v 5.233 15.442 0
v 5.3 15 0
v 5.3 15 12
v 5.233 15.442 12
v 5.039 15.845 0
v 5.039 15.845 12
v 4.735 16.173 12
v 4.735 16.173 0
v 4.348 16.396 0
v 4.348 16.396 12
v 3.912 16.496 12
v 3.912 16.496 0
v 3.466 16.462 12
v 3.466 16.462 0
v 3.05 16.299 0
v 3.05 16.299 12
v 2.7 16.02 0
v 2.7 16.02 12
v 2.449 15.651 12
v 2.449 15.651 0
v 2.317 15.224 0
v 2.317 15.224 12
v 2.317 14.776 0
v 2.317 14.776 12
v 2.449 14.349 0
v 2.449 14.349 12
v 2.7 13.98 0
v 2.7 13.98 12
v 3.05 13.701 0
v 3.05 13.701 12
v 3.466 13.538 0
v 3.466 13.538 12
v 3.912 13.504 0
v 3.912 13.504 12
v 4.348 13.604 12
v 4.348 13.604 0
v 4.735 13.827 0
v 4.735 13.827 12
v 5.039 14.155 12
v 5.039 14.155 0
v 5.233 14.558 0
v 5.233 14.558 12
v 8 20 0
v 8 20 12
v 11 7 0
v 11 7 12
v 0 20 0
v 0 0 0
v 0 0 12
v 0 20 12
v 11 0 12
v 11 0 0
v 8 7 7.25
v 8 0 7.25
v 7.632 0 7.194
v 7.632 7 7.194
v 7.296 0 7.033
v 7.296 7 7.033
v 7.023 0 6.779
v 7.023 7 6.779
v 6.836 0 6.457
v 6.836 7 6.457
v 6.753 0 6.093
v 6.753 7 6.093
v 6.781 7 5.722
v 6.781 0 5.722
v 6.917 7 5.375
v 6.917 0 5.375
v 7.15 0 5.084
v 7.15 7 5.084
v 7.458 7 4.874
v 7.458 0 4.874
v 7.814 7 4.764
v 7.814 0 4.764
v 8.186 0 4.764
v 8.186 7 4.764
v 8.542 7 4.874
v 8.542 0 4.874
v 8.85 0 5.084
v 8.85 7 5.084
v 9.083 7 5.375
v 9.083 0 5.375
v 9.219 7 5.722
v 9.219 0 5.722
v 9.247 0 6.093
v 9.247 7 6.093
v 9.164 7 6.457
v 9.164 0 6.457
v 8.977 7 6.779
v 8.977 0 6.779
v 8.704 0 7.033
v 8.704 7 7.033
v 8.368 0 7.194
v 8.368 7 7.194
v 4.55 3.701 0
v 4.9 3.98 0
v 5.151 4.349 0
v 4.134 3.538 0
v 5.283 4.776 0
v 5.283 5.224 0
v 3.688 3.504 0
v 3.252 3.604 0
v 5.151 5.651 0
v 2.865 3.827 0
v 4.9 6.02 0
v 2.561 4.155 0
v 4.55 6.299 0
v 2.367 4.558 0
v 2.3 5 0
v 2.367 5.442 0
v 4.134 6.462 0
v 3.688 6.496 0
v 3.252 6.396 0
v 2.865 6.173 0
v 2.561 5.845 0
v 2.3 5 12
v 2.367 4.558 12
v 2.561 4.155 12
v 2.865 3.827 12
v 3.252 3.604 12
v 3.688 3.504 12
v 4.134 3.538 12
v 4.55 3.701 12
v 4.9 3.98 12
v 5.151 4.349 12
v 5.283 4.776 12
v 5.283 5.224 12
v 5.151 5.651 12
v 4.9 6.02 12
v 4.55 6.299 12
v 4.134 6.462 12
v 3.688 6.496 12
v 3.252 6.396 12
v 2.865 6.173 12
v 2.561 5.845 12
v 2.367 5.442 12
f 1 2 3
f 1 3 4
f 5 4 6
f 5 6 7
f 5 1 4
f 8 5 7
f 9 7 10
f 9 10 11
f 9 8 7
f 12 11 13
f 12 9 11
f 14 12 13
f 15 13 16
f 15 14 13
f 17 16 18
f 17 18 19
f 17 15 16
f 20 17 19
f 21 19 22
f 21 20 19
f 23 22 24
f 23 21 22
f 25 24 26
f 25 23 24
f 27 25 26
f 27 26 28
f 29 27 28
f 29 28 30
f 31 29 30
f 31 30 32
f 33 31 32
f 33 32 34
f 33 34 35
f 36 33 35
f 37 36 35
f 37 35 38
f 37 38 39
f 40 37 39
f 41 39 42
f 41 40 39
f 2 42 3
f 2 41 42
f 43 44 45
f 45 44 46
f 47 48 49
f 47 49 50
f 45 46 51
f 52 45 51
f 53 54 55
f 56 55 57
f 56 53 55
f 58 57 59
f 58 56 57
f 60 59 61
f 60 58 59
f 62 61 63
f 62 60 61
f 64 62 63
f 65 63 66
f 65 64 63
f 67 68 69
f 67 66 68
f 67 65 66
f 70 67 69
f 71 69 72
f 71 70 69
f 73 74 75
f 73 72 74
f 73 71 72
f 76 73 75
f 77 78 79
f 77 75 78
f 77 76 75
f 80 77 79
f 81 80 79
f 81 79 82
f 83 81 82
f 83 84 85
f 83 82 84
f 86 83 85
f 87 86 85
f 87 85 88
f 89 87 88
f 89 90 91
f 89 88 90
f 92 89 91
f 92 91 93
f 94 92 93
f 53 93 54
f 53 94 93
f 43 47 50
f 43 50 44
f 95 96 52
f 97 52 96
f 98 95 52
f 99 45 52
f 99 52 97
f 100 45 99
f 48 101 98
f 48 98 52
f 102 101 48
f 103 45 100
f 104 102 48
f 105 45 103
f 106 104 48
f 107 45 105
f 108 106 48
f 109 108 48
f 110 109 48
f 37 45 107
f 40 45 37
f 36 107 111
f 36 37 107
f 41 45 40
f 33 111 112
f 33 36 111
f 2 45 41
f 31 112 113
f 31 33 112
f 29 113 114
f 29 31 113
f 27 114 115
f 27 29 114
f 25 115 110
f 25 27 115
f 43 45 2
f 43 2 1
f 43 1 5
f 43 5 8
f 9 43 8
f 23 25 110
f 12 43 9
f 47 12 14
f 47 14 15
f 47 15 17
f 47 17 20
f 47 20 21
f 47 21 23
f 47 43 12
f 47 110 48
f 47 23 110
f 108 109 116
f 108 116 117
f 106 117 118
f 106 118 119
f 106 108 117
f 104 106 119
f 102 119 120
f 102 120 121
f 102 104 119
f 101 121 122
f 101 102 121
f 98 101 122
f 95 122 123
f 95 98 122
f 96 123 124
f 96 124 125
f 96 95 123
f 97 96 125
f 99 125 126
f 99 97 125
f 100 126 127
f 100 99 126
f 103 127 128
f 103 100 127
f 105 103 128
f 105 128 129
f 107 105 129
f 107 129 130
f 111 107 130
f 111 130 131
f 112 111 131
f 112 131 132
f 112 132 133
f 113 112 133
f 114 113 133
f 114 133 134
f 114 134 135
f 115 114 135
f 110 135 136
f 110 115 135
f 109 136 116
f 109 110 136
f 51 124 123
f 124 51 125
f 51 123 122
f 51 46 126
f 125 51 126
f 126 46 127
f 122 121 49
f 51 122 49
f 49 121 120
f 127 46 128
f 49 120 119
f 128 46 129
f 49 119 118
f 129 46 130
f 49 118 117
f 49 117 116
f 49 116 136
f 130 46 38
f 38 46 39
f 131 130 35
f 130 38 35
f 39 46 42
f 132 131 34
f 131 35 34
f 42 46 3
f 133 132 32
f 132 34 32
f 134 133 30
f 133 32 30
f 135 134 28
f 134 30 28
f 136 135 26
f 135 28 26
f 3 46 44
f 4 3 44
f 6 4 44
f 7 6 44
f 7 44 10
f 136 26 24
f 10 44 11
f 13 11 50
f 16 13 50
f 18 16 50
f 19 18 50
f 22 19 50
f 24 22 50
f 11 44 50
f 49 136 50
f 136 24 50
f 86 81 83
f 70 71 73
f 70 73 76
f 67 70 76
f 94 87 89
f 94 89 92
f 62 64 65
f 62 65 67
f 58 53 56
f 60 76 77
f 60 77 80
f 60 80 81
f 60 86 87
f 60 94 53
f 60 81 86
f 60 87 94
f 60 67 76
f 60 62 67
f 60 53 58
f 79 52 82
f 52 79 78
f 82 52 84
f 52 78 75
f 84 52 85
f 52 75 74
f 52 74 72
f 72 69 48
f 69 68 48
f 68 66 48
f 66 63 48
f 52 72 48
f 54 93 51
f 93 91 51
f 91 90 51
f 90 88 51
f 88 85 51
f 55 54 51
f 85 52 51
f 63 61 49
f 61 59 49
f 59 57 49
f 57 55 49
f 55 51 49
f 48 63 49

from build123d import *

# Parameters (mm, degrees)
SKETCH_1_W               = 8
SKETCH_1_H               = 20
SKETCH_1_R               = 1.5
EXTRUDE_1_DEPTH          = 12
EXTRUDE_2_DEPTH          = 12
CUT_EXTRUDE_1_DEPTH      = 26.787593916
CUT_EXTRUDE_1_DEPTH_BACK = 7
SKETCH_3_R               = 1.25


with BuildPart() as part:
    # 草图1 → 凸台-拉伸1 (new body)
    with BuildSketch(Plane.XY):
        with Locations((4, 10)):
            Rectangle(SKETCH_1_W, SKETCH_1_H)
        with Locations((3.8, 15)):
            Circle(SKETCH_1_R, mode=Mode.SUBTRACT)
        with Locations(Location((3.8, 5, 0), (0, 0, 180))):
            Circle(SKETCH_1_R, mode=Mode.SUBTRACT)
    extrude(amount=EXTRUDE_1_DEPTH)

    # 草图2 → 凸台-拉伸2 (add)
    with BuildSketch(Plane.XY.offset(12)):
        Polygon((8, 20), (11, 7), (11, 0), (8, 0), align=None)
    extrude(amount=-EXTRUDE_2_DEPTH)

    # 草图3 → 切除-拉伸1 (cut, two sides: drawn at the far end of the back side and taken through both)
    with BuildSketch(Plane.XZ.offset(-CUT_EXTRUDE_1_DEPTH_BACK)):
        with Locations(Location((8, 6, 0), (0, 0, 90))):
            Circle(SKETCH_3_R)
    extrude(amount=CUT_EXTRUDE_1_DEPTH + CUT_EXTRUDE_1_DEPTH_BACK, mode=Mode.SUBTRACT)


solid = part.part
